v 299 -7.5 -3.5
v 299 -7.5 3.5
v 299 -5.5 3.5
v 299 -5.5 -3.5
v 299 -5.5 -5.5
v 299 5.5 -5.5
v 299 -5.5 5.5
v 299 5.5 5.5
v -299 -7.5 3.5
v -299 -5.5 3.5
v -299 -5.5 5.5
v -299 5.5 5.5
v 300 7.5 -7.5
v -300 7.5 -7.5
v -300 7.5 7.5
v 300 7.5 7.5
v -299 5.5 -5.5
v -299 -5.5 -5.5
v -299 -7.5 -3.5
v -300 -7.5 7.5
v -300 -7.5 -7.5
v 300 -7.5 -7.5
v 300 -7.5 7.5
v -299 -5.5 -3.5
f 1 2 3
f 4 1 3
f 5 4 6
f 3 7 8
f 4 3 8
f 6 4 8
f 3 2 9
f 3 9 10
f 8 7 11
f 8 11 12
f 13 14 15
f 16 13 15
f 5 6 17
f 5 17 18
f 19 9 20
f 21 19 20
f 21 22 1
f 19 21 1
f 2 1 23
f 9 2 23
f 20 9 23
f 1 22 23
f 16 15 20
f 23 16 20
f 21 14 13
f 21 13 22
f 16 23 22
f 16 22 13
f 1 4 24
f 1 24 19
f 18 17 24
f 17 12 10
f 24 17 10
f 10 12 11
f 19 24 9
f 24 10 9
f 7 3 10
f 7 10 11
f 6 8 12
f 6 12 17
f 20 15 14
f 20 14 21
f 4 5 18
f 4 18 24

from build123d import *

# Parameters (mm, degrees)
F1_DEPTH = 299
F3_W     = 15
F3_H     = 15
F4_DEPTH = 1
F6_W     = 15
F6_H     = 15
F7_DEPTH = 1


# Not quite as in the source:
# - the program builds the solid bodies; features that only make, move or delete a surface that nothing else refers to are left out


with BuildPart() as f1:
    # F0 (on Right) → F1 (new body, symmetric)
    with BuildSketch(Plane.YZ):
        Polygon((7.5, 7.5), (-7.5, 7.5), (-7.5, 3.5), (-5.5, 3.5), (-5.5, 5.5), (5.5, 5.5), (5.5, -5.5), (-5.5, -5.5), (-5.5, -3.5), (-7.5, -3.5), (-7.5, -7.5), (7.5, -7.5), align=None)
    extrude(amount=F1_DEPTH, both=True)

    # F3 (on offset) → F4 (join)
    with BuildSketch(Plane.YZ.offset(299)):
        Rectangle(F3_W, F3_H)
    extrude(amount=F4_DEPTH)

    # F6 (on offset) → F7 (join)
    with BuildSketch(Plane(origin=(-299, 0, 0), x_dir=(0, -1, 0), z_dir=(-1, 0, 0))):
        Rectangle(F6_W, F6_H)
    extrude(amount=F7_DEPTH)


solid = f1.part
